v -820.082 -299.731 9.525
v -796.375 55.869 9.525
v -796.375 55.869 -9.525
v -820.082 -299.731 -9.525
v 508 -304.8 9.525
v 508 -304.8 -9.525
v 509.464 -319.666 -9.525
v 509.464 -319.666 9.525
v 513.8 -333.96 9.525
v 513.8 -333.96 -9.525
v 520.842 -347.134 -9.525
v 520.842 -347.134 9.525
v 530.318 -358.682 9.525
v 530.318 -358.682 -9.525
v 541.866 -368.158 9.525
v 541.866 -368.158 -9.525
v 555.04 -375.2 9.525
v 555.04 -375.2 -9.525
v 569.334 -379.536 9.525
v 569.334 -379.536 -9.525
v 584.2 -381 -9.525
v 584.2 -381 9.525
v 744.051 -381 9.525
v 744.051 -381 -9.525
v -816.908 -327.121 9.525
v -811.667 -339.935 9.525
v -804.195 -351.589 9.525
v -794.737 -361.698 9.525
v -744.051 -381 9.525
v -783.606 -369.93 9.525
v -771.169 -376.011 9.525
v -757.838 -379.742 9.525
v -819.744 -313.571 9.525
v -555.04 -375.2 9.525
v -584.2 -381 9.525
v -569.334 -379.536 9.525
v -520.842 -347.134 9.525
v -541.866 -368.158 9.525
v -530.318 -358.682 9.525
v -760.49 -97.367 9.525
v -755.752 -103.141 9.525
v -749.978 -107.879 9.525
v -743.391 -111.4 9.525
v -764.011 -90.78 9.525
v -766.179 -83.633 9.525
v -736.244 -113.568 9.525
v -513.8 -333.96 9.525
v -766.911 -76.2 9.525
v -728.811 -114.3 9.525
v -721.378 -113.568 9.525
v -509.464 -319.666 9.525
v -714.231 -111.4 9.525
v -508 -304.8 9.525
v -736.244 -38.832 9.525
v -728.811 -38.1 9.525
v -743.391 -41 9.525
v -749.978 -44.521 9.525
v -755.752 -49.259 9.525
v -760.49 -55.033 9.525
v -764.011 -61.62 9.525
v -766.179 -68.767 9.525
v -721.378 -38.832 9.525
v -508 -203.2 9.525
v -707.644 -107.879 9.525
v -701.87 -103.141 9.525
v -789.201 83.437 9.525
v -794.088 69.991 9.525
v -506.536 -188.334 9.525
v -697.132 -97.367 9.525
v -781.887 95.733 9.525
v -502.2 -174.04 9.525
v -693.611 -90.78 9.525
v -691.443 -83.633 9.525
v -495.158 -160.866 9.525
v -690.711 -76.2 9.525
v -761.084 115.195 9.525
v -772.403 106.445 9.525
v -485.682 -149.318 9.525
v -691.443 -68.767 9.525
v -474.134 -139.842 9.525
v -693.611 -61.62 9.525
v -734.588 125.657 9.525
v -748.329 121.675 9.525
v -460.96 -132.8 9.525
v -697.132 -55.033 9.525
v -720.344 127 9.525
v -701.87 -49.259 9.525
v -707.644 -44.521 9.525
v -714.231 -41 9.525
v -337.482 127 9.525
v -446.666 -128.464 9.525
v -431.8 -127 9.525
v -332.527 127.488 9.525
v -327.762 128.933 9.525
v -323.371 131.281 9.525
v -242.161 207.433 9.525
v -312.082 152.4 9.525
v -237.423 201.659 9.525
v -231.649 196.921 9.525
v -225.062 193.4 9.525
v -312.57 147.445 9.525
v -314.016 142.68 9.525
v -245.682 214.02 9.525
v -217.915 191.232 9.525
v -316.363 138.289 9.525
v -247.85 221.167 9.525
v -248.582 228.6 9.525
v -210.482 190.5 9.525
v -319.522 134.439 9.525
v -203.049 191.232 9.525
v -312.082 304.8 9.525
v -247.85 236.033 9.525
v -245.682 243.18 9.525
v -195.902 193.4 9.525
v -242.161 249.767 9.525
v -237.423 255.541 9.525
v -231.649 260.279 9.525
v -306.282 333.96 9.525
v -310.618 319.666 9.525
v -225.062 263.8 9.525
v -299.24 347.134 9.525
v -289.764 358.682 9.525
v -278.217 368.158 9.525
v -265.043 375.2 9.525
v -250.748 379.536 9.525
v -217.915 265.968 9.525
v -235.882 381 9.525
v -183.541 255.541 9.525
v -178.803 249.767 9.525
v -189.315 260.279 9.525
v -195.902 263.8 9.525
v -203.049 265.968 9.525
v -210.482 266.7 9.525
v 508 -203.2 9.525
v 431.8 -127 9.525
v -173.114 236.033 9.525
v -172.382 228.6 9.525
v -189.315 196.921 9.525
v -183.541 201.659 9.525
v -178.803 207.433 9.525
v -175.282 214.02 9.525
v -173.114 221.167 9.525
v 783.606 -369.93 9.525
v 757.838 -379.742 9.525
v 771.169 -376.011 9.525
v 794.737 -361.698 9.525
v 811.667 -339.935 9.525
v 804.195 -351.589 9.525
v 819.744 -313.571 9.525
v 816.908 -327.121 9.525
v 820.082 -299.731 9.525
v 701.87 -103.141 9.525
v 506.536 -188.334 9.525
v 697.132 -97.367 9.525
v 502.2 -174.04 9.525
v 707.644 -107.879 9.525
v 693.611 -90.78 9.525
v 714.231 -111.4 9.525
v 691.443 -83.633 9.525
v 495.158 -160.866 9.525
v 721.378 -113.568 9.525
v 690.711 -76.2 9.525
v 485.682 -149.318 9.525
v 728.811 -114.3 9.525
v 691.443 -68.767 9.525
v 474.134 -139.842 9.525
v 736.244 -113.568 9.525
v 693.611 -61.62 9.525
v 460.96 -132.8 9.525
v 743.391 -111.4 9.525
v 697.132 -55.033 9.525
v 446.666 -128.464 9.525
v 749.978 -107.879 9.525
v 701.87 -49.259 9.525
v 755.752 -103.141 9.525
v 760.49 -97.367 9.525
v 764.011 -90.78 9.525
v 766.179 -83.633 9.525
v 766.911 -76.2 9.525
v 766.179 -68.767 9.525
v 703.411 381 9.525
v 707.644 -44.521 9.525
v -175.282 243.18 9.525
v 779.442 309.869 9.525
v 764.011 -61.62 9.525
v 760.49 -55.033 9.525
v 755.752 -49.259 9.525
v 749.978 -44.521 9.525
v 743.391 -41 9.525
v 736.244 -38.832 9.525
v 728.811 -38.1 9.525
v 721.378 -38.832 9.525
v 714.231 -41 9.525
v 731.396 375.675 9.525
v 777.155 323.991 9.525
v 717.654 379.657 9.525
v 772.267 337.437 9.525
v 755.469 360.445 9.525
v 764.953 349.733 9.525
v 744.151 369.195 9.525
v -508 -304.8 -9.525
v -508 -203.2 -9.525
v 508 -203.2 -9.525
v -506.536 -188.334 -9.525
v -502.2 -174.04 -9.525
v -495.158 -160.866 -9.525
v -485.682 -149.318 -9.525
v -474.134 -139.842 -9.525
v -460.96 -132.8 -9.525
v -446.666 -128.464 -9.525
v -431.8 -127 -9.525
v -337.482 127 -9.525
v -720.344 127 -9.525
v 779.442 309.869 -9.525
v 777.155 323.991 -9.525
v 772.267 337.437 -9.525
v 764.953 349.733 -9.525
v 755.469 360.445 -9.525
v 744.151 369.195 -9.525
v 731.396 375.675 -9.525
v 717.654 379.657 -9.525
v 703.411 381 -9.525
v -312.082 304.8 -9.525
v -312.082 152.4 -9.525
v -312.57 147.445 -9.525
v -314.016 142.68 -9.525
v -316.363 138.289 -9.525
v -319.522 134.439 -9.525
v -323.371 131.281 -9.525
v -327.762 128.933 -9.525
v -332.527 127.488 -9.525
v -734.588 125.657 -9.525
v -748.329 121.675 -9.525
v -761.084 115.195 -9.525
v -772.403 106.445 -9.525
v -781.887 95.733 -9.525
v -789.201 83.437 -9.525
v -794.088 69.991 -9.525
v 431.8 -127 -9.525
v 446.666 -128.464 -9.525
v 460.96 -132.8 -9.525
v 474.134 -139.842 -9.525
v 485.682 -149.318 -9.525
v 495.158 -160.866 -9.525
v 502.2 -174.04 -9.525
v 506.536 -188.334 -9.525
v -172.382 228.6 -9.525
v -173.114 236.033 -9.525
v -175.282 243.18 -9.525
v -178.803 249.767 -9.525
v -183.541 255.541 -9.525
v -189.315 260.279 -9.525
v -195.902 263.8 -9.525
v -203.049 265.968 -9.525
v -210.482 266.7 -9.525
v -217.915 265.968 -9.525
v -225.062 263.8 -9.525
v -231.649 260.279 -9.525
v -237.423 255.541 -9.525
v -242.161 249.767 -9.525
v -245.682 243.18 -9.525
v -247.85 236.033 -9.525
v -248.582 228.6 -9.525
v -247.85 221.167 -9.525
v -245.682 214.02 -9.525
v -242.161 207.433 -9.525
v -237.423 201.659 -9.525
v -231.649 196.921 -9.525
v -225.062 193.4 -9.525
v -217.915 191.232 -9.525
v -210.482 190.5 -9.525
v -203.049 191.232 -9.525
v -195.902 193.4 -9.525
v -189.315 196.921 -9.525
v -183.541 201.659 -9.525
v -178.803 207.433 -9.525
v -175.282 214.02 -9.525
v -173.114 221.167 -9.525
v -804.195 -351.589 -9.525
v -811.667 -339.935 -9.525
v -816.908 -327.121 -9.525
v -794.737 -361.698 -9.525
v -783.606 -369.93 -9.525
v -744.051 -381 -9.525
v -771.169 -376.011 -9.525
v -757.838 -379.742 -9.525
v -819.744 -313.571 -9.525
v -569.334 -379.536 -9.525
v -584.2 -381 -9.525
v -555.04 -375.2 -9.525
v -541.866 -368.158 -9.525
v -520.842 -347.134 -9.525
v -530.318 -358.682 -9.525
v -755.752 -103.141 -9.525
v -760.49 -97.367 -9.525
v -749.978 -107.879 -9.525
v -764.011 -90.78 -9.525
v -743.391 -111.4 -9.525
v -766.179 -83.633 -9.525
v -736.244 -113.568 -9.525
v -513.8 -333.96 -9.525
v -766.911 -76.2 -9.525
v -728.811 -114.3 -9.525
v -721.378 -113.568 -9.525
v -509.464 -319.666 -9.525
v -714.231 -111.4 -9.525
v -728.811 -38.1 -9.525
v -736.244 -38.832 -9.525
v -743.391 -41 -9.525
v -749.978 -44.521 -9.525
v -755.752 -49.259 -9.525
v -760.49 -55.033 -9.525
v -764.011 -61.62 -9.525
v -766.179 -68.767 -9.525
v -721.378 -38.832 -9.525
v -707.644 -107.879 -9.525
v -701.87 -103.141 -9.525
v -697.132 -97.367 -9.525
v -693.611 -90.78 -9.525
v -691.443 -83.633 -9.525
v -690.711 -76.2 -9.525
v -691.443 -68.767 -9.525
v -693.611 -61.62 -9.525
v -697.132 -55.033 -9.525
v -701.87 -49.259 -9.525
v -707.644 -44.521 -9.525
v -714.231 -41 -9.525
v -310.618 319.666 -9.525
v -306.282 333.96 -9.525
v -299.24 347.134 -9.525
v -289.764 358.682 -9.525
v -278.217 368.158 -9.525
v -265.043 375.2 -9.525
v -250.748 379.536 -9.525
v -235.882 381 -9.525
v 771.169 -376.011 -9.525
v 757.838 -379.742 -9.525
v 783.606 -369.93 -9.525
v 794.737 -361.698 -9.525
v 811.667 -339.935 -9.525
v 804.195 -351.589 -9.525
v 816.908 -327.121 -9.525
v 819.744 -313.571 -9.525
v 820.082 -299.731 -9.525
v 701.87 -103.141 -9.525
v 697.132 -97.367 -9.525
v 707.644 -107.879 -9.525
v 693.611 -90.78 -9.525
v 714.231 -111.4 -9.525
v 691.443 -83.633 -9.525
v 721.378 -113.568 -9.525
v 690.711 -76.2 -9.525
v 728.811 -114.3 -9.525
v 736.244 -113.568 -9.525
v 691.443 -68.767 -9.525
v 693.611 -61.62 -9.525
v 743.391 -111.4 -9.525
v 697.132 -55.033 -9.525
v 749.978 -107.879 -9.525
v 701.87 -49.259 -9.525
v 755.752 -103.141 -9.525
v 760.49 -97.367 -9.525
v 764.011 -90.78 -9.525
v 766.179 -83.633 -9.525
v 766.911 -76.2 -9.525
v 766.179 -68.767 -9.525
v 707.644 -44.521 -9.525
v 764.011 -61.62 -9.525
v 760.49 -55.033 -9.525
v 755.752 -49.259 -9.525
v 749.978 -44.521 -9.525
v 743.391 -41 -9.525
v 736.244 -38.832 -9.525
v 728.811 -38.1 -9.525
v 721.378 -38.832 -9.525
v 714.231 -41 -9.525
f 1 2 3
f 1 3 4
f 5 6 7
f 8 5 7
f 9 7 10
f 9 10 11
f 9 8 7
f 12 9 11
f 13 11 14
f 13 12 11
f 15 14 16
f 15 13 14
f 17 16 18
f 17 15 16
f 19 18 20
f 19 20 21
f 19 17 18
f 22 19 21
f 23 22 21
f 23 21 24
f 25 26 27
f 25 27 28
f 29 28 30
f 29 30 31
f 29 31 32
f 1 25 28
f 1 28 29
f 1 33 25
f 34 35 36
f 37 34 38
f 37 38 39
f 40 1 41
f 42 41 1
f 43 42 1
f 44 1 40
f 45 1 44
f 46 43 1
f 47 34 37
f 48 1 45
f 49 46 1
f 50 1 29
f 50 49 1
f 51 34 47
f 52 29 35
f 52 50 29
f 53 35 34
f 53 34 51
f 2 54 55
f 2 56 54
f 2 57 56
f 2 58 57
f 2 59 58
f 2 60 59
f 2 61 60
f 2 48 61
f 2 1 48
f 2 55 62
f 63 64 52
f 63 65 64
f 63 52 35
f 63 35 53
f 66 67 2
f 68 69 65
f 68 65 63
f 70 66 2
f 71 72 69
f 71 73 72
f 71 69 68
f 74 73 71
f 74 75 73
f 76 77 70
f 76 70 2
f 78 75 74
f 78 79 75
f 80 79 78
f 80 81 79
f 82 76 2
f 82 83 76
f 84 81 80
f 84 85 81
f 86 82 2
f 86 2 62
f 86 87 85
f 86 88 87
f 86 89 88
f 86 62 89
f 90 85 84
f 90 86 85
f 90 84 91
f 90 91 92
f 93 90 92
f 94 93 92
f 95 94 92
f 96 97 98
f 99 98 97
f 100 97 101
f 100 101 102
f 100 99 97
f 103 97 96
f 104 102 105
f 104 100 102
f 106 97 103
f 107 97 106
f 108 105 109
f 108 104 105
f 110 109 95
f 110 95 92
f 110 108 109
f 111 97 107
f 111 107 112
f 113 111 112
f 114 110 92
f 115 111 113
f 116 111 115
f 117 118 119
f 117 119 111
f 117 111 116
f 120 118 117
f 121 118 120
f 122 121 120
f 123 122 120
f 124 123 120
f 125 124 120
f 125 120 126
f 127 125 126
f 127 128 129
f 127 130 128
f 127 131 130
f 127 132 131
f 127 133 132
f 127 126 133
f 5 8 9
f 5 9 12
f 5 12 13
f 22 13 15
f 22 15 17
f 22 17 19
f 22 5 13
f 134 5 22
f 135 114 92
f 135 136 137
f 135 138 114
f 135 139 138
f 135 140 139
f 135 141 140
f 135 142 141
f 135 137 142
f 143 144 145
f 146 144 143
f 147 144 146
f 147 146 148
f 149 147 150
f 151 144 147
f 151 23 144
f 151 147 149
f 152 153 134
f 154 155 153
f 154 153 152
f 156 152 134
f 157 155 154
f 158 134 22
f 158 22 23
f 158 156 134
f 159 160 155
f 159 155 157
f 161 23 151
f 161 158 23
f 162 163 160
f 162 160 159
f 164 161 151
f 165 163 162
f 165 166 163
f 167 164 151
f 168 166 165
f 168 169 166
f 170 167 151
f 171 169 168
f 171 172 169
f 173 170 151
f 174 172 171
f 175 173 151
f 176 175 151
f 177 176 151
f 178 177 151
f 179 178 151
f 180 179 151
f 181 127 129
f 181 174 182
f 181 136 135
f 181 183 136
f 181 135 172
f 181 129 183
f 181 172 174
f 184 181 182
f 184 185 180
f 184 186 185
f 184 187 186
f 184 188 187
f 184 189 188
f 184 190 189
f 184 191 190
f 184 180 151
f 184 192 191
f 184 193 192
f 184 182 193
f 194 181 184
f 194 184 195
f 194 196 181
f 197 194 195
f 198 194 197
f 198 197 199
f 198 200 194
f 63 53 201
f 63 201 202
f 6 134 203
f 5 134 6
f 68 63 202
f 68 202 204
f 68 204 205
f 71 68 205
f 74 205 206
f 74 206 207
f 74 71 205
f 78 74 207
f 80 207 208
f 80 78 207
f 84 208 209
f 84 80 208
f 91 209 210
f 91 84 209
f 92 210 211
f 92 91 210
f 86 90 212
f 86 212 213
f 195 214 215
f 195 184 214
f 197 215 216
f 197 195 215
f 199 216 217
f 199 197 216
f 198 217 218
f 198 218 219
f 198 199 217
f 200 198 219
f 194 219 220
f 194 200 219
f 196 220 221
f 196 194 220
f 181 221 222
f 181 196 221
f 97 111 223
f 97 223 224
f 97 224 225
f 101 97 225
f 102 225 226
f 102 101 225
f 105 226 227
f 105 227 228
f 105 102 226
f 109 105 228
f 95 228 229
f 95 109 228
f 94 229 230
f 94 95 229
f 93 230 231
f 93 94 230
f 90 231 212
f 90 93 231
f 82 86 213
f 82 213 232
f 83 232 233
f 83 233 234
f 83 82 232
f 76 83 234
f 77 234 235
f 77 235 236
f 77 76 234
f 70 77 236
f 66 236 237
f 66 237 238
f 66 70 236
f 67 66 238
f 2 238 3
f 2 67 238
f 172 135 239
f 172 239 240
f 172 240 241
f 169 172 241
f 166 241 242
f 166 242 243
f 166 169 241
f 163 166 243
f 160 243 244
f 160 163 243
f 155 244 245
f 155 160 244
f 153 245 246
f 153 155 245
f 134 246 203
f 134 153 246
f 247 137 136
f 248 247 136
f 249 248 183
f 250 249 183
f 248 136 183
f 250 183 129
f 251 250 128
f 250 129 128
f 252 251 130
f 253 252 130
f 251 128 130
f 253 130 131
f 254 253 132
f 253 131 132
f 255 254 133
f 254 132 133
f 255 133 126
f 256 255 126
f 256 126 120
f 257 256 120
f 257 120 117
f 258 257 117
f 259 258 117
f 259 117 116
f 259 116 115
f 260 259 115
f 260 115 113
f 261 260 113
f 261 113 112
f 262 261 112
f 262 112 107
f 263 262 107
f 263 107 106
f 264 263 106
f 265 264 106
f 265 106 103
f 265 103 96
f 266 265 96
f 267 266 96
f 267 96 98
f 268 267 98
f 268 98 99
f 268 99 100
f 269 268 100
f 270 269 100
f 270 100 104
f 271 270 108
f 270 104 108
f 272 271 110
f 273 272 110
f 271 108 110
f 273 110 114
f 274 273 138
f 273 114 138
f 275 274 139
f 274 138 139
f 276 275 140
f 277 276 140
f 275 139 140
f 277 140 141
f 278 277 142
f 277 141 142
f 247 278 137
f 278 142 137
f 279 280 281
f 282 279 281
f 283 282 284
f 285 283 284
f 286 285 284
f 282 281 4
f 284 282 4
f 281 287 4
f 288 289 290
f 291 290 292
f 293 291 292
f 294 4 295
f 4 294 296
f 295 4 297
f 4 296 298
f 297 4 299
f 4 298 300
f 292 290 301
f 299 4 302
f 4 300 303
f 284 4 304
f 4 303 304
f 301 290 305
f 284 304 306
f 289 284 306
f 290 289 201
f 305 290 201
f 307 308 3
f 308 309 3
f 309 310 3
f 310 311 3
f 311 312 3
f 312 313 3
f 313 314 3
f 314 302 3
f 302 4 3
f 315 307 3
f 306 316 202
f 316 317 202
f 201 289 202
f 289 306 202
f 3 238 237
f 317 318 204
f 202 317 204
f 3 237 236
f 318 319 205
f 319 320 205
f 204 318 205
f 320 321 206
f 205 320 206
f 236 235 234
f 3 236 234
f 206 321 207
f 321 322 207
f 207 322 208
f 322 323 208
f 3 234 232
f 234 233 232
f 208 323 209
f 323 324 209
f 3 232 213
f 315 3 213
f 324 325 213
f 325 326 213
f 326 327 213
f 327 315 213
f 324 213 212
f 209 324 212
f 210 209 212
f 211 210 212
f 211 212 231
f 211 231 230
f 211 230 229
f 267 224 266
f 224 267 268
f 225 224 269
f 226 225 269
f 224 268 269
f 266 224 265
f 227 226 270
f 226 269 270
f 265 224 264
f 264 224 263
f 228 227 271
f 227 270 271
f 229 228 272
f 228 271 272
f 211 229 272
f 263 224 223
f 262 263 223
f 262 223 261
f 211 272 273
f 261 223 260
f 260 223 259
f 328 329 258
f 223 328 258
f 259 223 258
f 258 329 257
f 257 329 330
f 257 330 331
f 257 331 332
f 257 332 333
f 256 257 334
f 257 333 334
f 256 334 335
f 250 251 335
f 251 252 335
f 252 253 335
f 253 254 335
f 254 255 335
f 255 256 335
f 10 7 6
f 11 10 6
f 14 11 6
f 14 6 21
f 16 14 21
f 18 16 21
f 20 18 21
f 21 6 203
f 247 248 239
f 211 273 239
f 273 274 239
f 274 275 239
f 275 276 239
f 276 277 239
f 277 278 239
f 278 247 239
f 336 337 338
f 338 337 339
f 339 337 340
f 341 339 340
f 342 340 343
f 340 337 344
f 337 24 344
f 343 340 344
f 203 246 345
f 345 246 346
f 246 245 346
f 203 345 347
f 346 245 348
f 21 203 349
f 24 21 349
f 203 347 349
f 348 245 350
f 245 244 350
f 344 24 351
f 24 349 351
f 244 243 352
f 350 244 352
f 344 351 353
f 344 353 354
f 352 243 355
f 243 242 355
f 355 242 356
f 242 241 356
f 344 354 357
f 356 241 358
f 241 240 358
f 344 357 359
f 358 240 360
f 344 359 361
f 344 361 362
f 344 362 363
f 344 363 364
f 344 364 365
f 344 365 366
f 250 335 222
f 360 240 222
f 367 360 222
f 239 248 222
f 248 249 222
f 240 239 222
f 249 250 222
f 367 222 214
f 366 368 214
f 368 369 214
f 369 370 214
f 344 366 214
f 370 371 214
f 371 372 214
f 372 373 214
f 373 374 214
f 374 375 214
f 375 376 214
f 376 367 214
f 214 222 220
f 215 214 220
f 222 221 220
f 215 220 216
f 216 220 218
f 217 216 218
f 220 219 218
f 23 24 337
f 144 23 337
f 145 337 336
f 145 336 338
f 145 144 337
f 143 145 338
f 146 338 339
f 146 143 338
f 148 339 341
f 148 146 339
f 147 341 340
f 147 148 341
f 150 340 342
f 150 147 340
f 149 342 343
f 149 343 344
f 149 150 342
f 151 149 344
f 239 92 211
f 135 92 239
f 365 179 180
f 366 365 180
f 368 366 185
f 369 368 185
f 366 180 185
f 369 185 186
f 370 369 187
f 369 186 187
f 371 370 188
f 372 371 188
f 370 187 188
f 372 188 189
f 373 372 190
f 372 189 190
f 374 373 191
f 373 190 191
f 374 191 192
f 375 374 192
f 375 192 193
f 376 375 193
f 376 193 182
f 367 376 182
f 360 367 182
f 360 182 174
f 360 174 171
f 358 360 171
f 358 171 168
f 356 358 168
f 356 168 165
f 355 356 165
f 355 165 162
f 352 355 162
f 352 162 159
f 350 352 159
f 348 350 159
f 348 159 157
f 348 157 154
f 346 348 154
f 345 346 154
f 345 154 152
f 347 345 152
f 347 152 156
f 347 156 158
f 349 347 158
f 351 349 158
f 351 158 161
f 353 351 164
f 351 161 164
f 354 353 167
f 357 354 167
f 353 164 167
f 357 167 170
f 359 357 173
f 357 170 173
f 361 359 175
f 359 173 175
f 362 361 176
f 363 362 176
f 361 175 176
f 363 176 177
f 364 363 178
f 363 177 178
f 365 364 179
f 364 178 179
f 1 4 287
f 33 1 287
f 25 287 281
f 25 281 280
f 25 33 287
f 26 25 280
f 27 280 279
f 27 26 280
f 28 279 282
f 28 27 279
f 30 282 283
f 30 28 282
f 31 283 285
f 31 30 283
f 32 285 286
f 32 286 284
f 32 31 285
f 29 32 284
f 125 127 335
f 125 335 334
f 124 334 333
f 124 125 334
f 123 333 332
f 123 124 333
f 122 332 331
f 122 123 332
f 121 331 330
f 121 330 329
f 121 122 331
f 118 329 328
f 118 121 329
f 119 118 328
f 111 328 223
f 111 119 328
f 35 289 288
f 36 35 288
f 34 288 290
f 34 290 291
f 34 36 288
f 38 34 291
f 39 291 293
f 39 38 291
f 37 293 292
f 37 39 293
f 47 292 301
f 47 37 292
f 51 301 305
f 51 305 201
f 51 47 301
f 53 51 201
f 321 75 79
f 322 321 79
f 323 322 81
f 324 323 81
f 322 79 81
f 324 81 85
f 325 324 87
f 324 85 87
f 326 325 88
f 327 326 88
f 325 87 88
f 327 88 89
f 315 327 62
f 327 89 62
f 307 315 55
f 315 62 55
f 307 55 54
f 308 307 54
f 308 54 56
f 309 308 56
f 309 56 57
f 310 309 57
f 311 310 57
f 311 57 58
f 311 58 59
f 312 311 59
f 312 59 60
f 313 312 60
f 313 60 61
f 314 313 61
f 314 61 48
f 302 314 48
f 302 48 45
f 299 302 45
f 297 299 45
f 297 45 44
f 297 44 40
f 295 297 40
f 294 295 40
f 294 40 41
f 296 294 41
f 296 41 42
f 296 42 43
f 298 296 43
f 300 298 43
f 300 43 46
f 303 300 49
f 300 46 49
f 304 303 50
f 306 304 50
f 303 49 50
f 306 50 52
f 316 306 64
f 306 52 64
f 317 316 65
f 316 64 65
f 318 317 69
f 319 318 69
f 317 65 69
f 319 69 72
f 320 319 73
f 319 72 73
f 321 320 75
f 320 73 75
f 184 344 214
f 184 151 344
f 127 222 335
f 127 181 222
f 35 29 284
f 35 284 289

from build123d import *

# Parameters (mm, degrees)
F1_DEPTH = 9.525
F2_R     = 38.1
F3_DEPTH = 19.051
F4_R     = 38.1
F5_DEPTH = 19.051
F6_R     = 38.1
F7_DEPTH = 25.4


with BuildPart() as f1:
    # F0 (on Top) → F1 (new body, symmetric)
    with BuildSketch(Plane.XY):
        with BuildLine():
            Line((703.410854, 381), (-235.882083, 381))
            ThreePointArc((-235.882083, 381), (-289.76362, 358.681537), (-312.082083, 304.8))
            Line((-312.082083, 304.8), (-312.082083, 152.4))
            ThreePointArc((-312.082083, 152.4), (-319.521571, 134.439488), (-337.482083, 127))
            Line((-337.482083, 127), (-720.344188, 127))
            ThreePointArc((-720.344188, 127), (-772.402815, 106.44476), (-796.375417, 55.868749))
            Line((-796.375417, 55.868749), (-820.082083, -299.731251))
            ThreePointArc((-820.082083, -299.731251), (-799.695614, -356.858627), (-744.050854, -381))
            Line((-744.050854, -381), (-584.2, -381))
            ThreePointArc((-584.2, -381), (-530.318463, -358.681537), (-508, -304.8))
            Line((-508, -304.8), (-508, -203.2))
            ThreePointArc((-508, -203.2), (-485.681537, -149.318463), (-431.8, -127))
            Line((-431.8, -127), (431.8, -127))
            ThreePointArc((431.8, -127), (485.681537, -149.318463), (508, -203.2))
            Line((508, -203.2), (508, -304.8))
            ThreePointArc((508, -304.8), (530.318463, -358.681537), (584.2, -381))
            Line((584.2, -381), (744.050854, -381))
            ThreePointArc((744.050854, -381), (799.695614, -356.858627), (820.082083, -299.731251))
            Line((820.082083, -299.731251), (779.442083, 309.868749))
            ThreePointArc((779.442083, 309.868749), (755.469482, 360.44476), (703.410854, 381))
        make_face()
    extrude(amount=F1_DEPTH, both=True)

    # F2 (on face) → F3 (cut, through all)
    with BuildSketch(Plane.XY.offset(9.525)):
        with Locations((-210.482083, 228.6)):
            Circle(F2_R)
    extrude(amount=-F3_DEPTH, mode=Mode.SUBTRACT)

    # F4 (on face) → F5 (cut, through all)
    with BuildSketch(Plane.XY.offset(9.525)):
        with Locations((-728.810854, -76.2)):
            Circle(F4_R)
    extrude(amount=-F5_DEPTH, mode=Mode.SUBTRACT)

    # F6 (on face) → F7 (cut)
    with BuildSketch(Plane.XY.offset(9.525)):
        with Locations((728.810854, -76.2)):
            Circle(F6_R)
    extrude(amount=-F7_DEPTH, mode=Mode.SUBTRACT)


solid = f1.part
